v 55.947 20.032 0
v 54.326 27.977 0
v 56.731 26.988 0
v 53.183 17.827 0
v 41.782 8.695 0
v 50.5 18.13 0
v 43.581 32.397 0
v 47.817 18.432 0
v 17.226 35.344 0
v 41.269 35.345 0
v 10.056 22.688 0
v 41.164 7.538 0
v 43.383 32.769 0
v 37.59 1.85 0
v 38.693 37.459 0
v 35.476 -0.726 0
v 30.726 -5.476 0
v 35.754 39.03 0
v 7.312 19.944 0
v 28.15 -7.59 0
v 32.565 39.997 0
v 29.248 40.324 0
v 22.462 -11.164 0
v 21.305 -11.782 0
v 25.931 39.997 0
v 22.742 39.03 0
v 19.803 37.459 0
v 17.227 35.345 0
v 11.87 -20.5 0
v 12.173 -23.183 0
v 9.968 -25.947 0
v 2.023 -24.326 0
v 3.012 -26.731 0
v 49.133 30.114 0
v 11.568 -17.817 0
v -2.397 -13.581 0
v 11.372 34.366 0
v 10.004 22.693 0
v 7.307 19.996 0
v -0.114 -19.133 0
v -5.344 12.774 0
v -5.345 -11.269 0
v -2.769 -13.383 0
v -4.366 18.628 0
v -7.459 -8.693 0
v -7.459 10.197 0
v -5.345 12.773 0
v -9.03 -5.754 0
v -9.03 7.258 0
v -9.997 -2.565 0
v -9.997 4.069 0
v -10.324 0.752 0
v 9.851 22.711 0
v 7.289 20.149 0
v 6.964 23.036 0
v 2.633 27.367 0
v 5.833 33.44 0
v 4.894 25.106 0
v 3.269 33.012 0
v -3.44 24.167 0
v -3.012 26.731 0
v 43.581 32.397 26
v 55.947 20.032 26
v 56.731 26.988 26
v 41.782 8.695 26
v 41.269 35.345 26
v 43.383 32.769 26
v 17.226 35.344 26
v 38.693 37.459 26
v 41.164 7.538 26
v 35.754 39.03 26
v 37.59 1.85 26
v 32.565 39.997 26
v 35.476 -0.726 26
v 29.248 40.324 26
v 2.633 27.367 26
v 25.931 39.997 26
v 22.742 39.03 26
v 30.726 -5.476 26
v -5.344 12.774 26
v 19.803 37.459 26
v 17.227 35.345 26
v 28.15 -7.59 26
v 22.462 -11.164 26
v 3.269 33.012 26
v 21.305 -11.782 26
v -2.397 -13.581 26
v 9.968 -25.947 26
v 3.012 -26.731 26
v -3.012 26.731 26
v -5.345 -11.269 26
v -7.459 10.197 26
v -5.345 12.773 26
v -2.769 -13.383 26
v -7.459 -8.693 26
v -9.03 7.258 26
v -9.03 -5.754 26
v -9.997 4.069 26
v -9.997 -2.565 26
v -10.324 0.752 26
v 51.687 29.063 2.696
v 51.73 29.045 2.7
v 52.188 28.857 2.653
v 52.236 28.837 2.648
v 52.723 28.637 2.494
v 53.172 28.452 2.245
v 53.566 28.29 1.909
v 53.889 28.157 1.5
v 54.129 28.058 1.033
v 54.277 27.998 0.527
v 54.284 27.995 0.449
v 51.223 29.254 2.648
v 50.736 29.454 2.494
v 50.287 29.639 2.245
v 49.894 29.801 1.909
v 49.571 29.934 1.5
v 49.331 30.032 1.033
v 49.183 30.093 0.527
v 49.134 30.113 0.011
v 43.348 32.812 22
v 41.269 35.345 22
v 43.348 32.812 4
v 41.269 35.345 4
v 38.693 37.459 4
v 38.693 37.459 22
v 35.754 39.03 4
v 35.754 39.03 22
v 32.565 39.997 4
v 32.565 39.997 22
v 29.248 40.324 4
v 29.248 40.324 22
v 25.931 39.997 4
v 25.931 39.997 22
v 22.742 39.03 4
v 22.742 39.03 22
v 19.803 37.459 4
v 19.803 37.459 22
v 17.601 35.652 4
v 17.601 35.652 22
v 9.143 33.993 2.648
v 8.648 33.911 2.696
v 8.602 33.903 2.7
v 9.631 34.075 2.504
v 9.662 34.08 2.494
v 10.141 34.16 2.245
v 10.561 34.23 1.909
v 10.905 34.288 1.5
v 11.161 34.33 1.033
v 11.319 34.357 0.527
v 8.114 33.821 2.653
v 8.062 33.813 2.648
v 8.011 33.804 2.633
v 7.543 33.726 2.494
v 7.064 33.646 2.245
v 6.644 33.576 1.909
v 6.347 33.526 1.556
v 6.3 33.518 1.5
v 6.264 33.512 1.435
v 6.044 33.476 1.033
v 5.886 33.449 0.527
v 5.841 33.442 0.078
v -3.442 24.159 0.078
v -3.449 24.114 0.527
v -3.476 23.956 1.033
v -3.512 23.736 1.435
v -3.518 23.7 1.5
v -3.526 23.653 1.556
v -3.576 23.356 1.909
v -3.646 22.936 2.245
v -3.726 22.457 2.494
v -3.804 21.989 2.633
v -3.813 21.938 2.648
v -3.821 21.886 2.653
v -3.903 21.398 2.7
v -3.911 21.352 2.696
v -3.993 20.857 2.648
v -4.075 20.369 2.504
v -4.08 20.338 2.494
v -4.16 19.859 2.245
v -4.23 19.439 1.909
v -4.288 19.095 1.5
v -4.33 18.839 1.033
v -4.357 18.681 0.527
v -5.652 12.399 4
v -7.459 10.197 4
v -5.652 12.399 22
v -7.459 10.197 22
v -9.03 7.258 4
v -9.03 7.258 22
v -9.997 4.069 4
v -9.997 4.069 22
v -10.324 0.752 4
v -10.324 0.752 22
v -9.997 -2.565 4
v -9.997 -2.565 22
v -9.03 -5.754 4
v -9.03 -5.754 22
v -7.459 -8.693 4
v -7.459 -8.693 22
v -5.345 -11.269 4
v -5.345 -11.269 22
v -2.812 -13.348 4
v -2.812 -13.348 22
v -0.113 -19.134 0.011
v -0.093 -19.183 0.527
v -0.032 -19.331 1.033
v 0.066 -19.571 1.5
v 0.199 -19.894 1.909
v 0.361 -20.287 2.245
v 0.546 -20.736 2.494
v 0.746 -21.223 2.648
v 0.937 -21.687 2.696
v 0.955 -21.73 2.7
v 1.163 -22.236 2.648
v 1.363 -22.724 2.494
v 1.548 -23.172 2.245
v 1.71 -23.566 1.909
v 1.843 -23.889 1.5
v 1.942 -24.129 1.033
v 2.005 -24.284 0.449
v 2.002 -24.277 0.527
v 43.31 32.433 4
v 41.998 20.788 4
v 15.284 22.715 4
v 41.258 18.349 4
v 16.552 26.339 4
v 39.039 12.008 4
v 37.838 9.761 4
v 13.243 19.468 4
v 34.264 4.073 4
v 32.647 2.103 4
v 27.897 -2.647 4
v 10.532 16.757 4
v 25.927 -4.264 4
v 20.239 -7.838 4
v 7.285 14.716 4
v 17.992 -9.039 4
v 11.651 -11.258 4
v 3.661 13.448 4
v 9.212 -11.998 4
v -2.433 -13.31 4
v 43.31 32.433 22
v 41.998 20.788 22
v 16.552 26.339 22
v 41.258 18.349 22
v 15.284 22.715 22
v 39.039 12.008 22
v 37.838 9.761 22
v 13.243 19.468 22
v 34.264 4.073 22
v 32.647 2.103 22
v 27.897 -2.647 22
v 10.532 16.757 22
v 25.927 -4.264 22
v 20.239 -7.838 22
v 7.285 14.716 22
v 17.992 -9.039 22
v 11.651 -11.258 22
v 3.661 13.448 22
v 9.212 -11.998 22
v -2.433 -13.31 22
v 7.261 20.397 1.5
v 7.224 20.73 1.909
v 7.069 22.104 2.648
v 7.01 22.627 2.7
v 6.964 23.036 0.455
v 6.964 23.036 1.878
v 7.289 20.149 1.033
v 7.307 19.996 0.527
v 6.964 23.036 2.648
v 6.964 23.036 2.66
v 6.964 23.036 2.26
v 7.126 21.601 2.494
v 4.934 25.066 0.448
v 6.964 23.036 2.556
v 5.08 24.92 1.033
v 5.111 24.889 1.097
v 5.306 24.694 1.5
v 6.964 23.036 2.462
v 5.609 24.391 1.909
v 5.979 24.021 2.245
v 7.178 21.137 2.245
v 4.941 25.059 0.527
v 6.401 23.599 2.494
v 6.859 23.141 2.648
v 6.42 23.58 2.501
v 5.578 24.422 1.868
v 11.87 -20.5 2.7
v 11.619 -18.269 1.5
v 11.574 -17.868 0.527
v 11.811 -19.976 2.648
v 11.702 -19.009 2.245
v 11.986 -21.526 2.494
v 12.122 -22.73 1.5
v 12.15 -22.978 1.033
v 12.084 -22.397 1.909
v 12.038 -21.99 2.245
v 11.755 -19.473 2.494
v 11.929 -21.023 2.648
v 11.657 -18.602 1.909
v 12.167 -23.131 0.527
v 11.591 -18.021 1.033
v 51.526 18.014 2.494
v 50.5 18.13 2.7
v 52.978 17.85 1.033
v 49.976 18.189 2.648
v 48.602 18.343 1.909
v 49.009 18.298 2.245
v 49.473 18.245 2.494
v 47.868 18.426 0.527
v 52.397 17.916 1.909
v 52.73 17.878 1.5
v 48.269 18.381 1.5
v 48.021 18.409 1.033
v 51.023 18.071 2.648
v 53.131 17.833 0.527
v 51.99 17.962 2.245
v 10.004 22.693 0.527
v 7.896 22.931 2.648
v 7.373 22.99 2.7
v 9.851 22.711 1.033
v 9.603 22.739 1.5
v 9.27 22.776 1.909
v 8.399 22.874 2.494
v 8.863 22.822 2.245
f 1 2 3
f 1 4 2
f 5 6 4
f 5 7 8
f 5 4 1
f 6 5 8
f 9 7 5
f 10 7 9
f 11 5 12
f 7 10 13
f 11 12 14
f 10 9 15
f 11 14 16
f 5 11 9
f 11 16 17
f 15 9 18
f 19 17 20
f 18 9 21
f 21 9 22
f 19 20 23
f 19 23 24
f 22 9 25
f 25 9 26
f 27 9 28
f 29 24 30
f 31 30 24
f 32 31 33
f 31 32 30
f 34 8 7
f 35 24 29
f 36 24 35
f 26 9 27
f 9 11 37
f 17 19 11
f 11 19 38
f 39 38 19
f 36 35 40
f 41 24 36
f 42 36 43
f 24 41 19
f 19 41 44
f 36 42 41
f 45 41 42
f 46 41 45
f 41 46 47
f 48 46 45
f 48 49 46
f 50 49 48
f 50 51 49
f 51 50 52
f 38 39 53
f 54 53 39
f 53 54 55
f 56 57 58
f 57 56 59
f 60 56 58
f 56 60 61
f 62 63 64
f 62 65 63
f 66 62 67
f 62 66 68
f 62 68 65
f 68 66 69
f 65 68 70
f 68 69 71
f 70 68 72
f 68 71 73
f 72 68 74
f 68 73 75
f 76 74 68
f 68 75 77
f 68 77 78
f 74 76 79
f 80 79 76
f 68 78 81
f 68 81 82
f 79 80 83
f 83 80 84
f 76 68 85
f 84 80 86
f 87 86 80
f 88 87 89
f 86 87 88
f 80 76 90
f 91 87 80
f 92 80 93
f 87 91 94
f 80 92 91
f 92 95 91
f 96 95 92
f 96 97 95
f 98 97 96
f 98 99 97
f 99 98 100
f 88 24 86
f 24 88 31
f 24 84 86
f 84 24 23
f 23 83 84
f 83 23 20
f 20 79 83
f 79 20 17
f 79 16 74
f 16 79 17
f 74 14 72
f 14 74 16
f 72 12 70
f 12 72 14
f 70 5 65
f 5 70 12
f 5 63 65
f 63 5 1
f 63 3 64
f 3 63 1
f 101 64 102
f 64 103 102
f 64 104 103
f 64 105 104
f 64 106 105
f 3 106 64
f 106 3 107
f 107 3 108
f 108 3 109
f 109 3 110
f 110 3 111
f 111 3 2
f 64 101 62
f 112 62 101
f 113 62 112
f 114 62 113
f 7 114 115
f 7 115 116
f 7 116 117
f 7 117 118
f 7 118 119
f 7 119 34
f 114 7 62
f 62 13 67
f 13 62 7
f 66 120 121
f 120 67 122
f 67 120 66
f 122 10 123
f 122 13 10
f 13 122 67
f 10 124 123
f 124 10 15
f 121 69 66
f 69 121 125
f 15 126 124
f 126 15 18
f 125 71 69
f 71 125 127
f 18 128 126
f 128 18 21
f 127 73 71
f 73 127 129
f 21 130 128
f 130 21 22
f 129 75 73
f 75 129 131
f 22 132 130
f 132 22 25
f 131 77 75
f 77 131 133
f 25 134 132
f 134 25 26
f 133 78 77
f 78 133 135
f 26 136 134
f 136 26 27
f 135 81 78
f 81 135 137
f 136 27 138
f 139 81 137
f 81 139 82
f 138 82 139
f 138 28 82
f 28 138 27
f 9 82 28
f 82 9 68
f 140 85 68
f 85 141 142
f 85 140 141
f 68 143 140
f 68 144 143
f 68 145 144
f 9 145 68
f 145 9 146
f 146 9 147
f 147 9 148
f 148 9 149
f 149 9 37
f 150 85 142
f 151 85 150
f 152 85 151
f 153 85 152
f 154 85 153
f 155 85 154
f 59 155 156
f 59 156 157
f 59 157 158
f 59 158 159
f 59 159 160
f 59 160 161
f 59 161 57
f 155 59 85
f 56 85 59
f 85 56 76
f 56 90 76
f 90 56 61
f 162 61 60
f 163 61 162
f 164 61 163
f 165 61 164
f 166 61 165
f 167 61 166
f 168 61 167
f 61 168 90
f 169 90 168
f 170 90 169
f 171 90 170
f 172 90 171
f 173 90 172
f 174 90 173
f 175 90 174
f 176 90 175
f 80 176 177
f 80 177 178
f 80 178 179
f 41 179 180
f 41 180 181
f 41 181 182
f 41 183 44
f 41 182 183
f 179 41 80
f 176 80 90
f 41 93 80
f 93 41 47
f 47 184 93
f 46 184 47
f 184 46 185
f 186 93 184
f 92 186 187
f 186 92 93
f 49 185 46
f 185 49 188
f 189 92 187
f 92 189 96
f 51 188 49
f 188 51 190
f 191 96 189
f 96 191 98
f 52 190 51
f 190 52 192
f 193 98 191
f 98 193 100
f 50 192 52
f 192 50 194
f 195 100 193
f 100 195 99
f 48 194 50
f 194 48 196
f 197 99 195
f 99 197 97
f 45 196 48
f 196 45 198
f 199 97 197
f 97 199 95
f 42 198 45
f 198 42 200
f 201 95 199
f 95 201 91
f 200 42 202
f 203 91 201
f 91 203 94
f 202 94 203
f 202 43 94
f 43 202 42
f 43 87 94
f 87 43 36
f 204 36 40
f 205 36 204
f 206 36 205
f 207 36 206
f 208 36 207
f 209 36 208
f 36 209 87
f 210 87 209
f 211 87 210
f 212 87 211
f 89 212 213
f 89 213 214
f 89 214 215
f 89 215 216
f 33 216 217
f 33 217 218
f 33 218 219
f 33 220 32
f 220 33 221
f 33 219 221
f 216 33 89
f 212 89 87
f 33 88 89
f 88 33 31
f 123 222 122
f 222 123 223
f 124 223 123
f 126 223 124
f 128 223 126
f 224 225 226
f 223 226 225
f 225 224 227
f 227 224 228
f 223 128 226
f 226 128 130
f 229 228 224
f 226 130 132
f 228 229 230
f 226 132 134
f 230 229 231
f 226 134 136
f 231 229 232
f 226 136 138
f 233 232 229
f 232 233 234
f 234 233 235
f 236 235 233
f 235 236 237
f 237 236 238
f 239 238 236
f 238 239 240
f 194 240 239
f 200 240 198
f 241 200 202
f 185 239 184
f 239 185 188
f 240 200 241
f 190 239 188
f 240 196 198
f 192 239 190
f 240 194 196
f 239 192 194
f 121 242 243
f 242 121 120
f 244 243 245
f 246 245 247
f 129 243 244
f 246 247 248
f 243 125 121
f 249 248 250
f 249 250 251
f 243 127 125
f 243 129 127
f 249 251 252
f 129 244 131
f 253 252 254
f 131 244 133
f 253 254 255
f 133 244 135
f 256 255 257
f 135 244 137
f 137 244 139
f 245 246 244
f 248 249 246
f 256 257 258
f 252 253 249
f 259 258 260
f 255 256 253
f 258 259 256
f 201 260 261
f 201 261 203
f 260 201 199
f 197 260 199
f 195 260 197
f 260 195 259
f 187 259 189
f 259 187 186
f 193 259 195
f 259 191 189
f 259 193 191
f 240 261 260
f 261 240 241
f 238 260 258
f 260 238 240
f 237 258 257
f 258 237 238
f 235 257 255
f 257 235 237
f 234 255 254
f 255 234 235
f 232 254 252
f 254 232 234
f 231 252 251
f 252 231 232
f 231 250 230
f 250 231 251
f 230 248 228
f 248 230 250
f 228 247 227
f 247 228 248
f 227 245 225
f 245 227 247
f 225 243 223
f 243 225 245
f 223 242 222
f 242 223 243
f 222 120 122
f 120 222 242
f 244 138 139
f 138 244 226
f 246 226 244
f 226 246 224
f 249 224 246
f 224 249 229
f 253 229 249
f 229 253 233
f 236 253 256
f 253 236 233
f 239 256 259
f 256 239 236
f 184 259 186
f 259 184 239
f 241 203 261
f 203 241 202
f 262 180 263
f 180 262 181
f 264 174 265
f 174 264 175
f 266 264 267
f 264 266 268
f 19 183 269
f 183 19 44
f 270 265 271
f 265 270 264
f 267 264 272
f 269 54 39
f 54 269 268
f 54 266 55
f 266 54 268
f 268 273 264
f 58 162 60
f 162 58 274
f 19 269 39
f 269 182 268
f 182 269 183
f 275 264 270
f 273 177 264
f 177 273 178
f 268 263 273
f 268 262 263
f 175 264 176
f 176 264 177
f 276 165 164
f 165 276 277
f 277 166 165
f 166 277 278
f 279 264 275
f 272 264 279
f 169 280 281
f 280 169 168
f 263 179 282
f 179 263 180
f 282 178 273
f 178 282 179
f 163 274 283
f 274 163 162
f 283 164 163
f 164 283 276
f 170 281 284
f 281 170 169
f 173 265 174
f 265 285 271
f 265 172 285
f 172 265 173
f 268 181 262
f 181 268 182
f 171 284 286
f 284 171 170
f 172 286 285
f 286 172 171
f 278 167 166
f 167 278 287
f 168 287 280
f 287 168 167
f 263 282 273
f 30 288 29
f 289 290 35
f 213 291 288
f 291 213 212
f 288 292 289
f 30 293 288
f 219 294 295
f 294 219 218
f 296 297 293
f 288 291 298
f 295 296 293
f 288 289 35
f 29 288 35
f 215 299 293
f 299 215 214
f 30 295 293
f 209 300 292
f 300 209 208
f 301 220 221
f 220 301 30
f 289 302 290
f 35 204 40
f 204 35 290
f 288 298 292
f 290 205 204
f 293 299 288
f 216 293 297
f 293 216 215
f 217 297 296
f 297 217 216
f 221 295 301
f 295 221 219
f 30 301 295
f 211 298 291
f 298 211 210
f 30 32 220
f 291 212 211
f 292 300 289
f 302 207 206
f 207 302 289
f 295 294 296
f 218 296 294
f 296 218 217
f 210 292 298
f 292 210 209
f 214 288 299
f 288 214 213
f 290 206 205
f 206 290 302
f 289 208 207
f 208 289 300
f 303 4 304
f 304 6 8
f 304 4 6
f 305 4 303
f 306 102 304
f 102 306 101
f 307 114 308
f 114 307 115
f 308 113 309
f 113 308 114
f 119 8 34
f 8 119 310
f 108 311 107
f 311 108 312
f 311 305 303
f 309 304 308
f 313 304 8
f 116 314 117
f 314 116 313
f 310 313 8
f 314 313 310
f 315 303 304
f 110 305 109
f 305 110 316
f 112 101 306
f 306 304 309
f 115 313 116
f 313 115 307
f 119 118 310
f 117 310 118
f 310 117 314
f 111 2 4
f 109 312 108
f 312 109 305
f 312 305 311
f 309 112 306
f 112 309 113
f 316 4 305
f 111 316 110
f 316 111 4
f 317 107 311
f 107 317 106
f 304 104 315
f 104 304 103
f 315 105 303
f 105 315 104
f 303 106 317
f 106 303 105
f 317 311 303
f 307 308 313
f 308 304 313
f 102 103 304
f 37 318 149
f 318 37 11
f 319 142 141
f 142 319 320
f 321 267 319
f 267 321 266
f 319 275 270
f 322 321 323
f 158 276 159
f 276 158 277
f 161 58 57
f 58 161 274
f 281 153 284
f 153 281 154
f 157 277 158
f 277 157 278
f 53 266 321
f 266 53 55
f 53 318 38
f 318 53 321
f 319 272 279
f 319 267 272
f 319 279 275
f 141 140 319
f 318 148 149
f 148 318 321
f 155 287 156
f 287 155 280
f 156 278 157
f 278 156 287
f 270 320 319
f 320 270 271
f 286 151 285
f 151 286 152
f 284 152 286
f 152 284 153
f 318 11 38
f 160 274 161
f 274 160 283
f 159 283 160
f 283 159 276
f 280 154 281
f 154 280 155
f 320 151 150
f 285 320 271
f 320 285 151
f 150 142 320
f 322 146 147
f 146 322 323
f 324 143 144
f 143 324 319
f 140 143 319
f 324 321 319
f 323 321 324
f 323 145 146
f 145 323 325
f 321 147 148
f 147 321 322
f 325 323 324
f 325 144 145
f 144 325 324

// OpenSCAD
$fn = 32;
// ----------------------------------------------------------------------
// Air duct: 34 mm duct, 4 mm wall, 26 mm across
// ----------------------------------------------------------------------

// --- parameters (mm) ---
duct_r = 17;              // duct core radius
duct_d = 34;              // duct core diameter
wall = 4;                 // duct wall thickness
height = 26;              // duct width (extrusion height)
port_r = 26.9;            // port flange half width
port_d = 53.8;            // port flange width
port_t = 7;               // port flange thickness
bolt_d = 5.4;             // port bolt holes
bolt_offset = 21.7;       // bolt hole offset from the port axis

difference() {
  /* outer hull chain: tube with a flat flange plate at every port */
  linear_extrude(height = 26) {
    hull() {
      polygon([[3.012, -26.731], [-3.012, 26.731], [3.944, 27.515], [9.968, -25.947]]);
      translate([9.937, 1.12]) circle(r = 17);
    }
    hull() {
      translate([9.937, 1.12]) circle(r = 17);
      translate([6.676, 0.752]) circle(r = 17);
    }
    hull() {
      translate([6.676, 0.752]) circle(r = 17);
      translate([13.017, 2.971]) circle(r = 17);
    }
    hull() {
      translate([13.017, 2.971]) circle(r = 17);
      translate([18.705, 6.545]) circle(r = 17);
    }
    hull() {
      translate([18.705, 6.545]) circle(r = 17);
      translate([23.455, 11.295]) circle(r = 17);
    }
    hull() {
      translate([23.455, 11.295]) circle(r = 17);
      translate([27.029, 16.983]) circle(r = 17);
    }
    hull() {
      translate([27.029, 16.983]) circle(r = 17);
      translate([29.248, 23.324]) circle(r = 17);
    }
    hull() {
      translate([29.248, 23.324]) circle(r = 17);
      translate([28.88, 20.063]) circle(r = 17);
    }
    hull() {
      translate([28.88, 20.063]) circle(r = 17);
      polygon([[3.269, 33.012], [56.731, 26.988], [55.947, 20.032], [2.485, 26.056]]);
    }
  }
  /* air passage: the same chain inset by the wall, 5 mm proud of the ports */
  translate([0, 0, 4]) linear_extrude(height = 18) {
    hull() {
      translate([-4.969, -0.56]) circle(r = 13);
      translate([6.676, 0.752]) circle(r = 13);
    }
    hull() {
      translate([6.676, 0.752]) circle(r = 13);
      translate([13.017, 2.971]) circle(r = 13);
    }
    hull() {
      translate([13.017, 2.971]) circle(r = 13);
      translate([18.705, 6.545]) circle(r = 13);
    }
    hull() {
      translate([18.705, 6.545]) circle(r = 13);
      translate([23.455, 11.295]) circle(r = 13);
    }
    hull() {
      translate([23.455, 11.295]) circle(r = 13);
      translate([27.029, 16.983]) circle(r = 13);
    }
    hull() {
      translate([27.029, 16.983]) circle(r = 13);
      translate([29.248, 23.324]) circle(r = 13);
    }
    hull() {
      translate([29.248, 23.324]) circle(r = 13);
      translate([30.56, 34.969]) circle(r = 13);
    }
  }
  translate([0, 0]) rotate([0, 0, -83.57]) translate([-21.7, -2.5]) rotate([-90, 0, 0]) cylinder(h = 12, d = 5.4);
  translate([0, 0]) rotate([0, 0, -83.57]) translate([21.7, -2.5]) rotate([-90, 0, 0]) cylinder(h = 12, d = 5.4);
  translate([30, 30]) rotate([0, 0, 173.57]) translate([-21.7, -2.5]) rotate([-90, 0, 0]) cylinder(h = 12, d = 5.4);
  translate([30, 30]) rotate([0, 0, 173.57]) translate([21.7, -2.5]) rotate([-90, 0, 0]) cylinder(h = 12, d = 5.4);
}
